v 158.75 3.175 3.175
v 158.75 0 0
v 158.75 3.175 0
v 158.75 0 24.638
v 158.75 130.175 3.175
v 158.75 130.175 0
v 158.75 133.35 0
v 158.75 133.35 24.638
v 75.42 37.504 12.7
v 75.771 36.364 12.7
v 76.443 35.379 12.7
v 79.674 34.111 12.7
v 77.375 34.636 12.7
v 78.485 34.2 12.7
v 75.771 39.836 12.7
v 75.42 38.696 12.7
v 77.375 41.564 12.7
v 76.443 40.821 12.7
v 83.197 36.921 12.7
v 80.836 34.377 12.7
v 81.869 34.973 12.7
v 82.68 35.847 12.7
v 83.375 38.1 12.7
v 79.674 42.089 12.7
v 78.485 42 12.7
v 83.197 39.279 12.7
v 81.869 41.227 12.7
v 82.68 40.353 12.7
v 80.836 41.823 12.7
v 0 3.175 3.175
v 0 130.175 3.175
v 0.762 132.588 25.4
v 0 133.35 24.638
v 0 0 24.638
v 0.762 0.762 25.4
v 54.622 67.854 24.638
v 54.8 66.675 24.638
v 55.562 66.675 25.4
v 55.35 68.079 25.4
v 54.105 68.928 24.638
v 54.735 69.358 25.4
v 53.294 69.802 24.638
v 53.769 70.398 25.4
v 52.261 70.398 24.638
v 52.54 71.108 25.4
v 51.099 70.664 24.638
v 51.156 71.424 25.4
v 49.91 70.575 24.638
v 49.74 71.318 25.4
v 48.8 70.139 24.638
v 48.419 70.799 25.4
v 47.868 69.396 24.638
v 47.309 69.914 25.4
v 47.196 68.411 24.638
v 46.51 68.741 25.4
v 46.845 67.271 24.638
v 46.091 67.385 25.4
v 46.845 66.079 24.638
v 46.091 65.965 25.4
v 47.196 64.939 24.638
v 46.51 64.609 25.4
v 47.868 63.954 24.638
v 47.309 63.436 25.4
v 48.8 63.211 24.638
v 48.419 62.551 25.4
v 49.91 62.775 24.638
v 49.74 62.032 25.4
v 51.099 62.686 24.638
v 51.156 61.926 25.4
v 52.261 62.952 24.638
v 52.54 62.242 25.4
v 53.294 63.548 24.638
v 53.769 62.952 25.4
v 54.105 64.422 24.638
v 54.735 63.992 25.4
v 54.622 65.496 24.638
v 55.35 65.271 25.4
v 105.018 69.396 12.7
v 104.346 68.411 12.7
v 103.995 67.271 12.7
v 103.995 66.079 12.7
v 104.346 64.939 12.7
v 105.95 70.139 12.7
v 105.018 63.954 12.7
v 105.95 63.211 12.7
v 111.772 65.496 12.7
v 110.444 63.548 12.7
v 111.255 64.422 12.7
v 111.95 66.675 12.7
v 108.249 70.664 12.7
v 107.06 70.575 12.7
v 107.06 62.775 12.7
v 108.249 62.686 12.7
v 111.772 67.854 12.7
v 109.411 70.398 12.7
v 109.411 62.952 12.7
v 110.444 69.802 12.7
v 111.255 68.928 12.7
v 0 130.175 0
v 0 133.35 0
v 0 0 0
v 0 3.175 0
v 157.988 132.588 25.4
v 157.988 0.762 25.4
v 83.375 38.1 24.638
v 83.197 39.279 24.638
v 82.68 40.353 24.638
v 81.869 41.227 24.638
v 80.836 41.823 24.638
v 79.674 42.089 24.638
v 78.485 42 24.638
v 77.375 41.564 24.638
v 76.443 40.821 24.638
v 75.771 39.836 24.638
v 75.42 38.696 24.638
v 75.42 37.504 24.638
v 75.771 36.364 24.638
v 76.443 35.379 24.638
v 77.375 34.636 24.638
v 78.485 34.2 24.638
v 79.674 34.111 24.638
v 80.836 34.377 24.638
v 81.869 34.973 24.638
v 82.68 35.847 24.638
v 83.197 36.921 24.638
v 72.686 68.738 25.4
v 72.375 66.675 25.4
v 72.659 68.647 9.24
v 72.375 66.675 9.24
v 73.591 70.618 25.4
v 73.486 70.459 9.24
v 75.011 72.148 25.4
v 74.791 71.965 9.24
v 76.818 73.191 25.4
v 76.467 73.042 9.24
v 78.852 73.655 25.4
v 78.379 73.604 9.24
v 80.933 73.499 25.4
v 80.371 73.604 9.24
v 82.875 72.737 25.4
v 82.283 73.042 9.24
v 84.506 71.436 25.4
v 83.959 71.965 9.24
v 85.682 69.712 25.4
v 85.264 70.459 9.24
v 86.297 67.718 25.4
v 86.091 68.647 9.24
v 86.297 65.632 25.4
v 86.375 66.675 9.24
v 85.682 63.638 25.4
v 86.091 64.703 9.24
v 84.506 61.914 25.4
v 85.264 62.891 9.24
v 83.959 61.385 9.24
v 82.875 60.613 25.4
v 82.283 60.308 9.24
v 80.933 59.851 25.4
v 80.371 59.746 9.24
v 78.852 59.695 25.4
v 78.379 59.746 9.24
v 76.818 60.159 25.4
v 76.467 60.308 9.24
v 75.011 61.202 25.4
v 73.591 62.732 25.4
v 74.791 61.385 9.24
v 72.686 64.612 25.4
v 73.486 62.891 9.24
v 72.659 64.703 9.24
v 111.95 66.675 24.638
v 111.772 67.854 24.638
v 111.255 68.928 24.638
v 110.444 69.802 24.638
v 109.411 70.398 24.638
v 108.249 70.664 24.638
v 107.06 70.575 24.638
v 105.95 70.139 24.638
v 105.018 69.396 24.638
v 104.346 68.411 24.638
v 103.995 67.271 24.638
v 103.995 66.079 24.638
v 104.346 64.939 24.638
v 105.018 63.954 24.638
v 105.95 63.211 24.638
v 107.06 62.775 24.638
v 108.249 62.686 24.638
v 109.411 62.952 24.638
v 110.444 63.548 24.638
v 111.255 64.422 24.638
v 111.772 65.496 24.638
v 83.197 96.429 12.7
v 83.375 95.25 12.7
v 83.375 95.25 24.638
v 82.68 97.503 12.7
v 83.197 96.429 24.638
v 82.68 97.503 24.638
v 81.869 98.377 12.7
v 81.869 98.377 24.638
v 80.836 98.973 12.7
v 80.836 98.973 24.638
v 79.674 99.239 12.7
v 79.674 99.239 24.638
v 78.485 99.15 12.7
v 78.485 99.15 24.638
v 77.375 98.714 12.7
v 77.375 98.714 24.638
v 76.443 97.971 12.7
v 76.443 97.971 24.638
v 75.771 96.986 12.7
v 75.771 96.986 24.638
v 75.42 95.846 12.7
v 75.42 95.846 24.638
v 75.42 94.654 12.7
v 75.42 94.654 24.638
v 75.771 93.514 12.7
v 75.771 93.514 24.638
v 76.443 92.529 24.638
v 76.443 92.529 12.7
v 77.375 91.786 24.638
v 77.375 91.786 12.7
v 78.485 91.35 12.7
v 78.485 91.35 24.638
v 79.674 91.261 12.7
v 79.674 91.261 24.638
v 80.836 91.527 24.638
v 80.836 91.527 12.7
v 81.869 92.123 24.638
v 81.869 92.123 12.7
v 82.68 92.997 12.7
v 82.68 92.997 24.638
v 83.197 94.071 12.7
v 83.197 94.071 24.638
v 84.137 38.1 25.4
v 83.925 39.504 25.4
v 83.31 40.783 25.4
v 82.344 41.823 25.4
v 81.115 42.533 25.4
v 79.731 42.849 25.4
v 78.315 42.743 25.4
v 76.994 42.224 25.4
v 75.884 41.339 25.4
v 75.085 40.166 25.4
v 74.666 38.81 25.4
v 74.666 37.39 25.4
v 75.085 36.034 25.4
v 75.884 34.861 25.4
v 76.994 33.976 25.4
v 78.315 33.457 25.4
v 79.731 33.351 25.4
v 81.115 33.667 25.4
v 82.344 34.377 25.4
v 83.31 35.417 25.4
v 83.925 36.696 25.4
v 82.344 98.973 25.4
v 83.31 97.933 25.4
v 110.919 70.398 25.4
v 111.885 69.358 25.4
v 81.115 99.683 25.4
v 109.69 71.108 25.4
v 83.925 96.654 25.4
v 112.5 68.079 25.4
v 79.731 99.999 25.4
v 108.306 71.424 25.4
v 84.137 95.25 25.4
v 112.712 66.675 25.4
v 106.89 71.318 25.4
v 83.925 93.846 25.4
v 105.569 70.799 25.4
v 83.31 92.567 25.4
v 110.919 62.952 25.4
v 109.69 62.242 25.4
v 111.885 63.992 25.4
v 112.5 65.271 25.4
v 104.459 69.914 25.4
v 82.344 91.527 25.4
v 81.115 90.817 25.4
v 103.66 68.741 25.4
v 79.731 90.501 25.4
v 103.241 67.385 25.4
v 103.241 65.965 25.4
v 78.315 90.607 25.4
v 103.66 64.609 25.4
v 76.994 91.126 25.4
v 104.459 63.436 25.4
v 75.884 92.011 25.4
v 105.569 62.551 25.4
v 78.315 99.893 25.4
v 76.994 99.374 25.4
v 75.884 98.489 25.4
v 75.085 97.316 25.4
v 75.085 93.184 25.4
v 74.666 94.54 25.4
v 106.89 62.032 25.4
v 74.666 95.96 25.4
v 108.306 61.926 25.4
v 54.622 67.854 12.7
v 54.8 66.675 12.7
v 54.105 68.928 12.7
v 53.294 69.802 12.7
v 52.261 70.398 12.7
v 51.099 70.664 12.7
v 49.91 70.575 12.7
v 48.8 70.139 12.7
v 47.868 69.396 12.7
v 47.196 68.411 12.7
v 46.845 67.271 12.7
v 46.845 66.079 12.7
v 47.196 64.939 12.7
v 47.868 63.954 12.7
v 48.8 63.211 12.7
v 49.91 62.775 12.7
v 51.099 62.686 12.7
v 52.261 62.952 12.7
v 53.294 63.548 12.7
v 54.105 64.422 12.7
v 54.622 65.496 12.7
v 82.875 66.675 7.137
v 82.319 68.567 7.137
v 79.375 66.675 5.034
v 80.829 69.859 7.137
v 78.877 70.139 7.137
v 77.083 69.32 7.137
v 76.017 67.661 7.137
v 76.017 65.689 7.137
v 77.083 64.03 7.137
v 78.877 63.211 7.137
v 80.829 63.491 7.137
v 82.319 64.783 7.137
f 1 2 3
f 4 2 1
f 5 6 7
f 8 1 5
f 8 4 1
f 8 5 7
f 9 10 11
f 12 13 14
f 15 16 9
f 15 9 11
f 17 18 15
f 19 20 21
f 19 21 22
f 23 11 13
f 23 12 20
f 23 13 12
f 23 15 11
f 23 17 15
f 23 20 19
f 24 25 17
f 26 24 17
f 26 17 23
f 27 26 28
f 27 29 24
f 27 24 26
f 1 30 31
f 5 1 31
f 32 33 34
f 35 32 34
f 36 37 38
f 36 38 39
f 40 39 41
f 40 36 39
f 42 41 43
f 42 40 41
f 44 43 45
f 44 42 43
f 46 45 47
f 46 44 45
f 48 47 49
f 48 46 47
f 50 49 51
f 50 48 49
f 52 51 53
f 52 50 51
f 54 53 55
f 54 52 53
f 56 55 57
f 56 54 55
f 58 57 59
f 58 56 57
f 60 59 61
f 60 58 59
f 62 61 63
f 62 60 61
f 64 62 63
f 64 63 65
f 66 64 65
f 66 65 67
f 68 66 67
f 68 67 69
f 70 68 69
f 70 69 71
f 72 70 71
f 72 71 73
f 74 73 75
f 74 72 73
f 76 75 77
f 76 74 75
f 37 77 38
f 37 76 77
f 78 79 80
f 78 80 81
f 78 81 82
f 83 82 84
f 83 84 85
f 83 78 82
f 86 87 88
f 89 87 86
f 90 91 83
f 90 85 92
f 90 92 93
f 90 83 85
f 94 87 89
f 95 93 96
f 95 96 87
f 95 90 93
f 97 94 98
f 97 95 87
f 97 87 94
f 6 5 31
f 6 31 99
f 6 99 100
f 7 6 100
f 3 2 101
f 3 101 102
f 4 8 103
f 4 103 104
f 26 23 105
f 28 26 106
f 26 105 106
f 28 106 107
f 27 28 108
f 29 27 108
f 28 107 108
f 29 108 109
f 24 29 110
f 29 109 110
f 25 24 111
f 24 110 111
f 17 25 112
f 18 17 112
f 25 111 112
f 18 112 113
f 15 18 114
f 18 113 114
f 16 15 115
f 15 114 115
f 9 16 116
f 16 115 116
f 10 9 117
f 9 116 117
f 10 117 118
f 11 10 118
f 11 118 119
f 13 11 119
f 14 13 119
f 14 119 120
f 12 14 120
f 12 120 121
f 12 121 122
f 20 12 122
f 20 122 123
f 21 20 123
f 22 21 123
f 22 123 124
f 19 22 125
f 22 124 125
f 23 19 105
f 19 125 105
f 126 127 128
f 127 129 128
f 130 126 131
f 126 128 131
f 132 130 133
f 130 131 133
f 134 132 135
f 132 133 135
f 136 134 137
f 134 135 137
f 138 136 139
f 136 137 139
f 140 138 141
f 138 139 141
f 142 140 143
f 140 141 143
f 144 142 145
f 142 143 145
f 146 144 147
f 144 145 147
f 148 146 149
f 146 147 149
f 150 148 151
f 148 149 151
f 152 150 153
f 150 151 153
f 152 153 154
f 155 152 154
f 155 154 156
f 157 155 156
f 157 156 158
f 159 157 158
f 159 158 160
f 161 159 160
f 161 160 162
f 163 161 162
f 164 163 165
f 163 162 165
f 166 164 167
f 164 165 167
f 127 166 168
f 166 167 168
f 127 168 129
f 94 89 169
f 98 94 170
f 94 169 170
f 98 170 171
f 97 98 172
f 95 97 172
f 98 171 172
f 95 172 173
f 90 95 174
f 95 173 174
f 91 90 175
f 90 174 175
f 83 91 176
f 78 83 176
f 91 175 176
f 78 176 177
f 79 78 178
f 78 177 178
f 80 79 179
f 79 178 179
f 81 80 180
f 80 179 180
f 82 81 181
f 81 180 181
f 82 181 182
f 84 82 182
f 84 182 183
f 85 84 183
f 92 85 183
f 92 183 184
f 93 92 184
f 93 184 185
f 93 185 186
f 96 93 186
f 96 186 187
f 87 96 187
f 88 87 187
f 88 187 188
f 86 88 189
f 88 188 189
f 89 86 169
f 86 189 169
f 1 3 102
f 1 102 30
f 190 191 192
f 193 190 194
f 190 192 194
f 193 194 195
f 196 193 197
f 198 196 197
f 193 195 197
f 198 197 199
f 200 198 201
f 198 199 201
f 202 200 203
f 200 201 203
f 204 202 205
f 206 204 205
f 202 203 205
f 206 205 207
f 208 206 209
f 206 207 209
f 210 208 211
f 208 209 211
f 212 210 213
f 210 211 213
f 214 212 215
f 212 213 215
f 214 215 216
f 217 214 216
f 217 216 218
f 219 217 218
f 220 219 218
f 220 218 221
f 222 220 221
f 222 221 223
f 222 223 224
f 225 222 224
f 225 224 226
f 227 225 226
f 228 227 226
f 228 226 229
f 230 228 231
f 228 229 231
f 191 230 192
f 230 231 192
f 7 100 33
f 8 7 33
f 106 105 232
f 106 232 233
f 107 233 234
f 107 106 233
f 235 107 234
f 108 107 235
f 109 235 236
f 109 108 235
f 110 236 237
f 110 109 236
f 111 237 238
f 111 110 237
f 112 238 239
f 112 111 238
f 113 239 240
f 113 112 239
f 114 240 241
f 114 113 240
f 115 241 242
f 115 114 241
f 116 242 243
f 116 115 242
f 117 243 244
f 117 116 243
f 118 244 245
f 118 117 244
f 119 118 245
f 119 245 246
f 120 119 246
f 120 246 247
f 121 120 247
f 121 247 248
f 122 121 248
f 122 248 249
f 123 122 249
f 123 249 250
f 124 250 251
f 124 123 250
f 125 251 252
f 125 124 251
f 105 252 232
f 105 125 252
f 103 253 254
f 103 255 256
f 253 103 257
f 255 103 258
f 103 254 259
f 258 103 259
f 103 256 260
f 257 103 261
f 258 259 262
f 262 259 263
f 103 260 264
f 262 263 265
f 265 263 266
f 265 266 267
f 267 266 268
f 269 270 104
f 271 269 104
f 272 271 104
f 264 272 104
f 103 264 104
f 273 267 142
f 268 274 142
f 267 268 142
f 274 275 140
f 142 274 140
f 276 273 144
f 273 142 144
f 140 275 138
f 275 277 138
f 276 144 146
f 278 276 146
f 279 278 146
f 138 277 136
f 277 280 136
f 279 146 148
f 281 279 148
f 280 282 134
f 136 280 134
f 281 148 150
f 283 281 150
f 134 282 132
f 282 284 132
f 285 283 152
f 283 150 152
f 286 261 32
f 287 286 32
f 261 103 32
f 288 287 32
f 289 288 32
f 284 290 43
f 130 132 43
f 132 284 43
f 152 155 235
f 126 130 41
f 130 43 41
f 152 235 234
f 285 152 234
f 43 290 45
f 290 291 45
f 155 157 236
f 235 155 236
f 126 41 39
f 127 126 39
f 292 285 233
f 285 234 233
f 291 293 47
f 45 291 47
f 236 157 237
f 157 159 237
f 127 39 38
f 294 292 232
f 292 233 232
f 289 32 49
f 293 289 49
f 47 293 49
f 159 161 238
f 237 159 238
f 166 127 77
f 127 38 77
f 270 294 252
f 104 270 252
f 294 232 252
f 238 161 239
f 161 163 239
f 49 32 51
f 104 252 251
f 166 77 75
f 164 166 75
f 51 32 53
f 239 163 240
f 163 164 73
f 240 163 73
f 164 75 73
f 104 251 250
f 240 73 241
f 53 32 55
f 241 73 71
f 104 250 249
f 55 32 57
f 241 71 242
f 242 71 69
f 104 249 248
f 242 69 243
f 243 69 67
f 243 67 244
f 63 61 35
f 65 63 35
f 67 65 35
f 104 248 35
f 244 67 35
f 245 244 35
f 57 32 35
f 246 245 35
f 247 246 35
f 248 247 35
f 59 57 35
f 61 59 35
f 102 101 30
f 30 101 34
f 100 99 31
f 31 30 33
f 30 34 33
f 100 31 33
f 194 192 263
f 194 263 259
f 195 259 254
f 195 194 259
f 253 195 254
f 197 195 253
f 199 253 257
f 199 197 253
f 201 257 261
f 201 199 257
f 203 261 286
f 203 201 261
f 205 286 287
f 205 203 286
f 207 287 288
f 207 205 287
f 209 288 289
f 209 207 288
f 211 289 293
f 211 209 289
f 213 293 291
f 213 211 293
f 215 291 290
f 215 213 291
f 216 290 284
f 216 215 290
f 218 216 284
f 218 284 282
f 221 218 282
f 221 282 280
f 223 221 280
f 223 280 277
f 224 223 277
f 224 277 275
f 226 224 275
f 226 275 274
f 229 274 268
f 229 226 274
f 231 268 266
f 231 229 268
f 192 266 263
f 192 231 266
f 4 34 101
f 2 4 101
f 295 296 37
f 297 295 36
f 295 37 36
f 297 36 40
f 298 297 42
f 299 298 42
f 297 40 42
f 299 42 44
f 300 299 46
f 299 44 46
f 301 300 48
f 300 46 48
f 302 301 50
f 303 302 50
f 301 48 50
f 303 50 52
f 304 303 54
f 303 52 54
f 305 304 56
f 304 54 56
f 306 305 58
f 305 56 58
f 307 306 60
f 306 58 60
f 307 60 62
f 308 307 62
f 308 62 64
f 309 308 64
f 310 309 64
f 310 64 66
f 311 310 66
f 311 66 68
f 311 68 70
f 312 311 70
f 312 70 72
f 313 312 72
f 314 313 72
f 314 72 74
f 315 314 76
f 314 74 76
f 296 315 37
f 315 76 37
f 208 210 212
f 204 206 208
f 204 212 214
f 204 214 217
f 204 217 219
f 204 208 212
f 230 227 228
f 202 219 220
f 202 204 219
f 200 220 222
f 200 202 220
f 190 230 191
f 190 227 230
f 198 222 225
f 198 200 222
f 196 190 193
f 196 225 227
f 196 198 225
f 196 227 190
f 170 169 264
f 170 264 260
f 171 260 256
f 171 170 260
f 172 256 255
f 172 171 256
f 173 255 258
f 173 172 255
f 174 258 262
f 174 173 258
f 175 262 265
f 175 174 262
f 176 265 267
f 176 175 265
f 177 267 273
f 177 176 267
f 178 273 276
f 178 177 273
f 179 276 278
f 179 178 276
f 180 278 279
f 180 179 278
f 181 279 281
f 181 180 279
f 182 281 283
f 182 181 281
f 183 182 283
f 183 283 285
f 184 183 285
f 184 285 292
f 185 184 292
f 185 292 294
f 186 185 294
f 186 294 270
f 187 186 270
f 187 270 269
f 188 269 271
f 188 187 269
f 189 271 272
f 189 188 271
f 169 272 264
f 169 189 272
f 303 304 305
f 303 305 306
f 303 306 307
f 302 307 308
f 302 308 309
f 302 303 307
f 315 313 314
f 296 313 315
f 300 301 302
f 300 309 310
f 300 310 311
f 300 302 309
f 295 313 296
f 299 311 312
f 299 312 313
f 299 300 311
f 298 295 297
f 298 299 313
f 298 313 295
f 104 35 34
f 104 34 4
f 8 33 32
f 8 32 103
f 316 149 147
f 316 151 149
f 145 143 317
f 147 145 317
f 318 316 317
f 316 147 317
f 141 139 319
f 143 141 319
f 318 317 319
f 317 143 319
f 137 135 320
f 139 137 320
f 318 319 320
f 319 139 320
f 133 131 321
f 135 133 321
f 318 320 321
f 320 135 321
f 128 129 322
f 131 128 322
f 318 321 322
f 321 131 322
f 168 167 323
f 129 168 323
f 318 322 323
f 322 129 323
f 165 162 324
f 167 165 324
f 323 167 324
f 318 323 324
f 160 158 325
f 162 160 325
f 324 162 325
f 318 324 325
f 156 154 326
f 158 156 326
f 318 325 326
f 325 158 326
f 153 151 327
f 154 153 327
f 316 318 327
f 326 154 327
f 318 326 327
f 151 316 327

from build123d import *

# Parameters (mm, degrees)
F1_DEPTH = 158.75
F2_R     = 4
F3_DEPTH = 12.7
F4_SIZE  = 0.762
F5_D     = 14
F5_DEPTH = 16.16
F5_TIP   = 4.2060243332


with BuildPart() as f1:
    # F0 (on Right) → F1 (new body)
    with BuildSketch(Plane.YZ):
        Polygon((0, 25.4), (0, 0), (3.175, 0), (3.175, 3.175), (130.175, 3.175), (130.175, 0), (133.35, 0), (133.35, 25.4), align=None)
    extrude(amount=F1_DEPTH)

    # F2 (on face) → F3 (cut)
    with BuildSketch(Plane.XY.offset(25.4)):
        with Locations((79.375, 95.25)):
            Circle(F2_R)
        with Locations((50.8, 66.675)):
            Circle(F2_R)
        with Locations((79.375, 38.1)):
            Circle(F2_R)
        with Locations((107.95, 66.675)):
            Circle(F2_R)
    extrude(amount=-F3_DEPTH, mode=Mode.SUBTRACT)

    # F4
    f4_edges = [f1.edges().sort_by_distance(p)[0] for p in [
        (75.375, 95.25, 25.4),
        (103.95, 66.675, 25.4),
        (75.375, 38.1, 25.4),
        (46.8, 66.675, 25.4),
        (79.375, 133.35, 25.4),
        (0, 66.675, 25.4),
        (79.375, 0, 25.4),
        (158.75, 66.675, 25.4),
    ]]
    chamfer(f4_edges, length=F4_SIZE)

    # F5
    with Locations(Plane.XY.offset(25.4)):
        with Locations((79.375, 66.675)):
            Hole(F5_D / 2, depth=F5_DEPTH)
            with Locations((0, 0, -(F5_DEPTH + F5_TIP / 2))):  # 118° drill point
                Cone(0, F5_D / 2, F5_TIP, mode=Mode.SUBTRACT)


solid = f1.part
